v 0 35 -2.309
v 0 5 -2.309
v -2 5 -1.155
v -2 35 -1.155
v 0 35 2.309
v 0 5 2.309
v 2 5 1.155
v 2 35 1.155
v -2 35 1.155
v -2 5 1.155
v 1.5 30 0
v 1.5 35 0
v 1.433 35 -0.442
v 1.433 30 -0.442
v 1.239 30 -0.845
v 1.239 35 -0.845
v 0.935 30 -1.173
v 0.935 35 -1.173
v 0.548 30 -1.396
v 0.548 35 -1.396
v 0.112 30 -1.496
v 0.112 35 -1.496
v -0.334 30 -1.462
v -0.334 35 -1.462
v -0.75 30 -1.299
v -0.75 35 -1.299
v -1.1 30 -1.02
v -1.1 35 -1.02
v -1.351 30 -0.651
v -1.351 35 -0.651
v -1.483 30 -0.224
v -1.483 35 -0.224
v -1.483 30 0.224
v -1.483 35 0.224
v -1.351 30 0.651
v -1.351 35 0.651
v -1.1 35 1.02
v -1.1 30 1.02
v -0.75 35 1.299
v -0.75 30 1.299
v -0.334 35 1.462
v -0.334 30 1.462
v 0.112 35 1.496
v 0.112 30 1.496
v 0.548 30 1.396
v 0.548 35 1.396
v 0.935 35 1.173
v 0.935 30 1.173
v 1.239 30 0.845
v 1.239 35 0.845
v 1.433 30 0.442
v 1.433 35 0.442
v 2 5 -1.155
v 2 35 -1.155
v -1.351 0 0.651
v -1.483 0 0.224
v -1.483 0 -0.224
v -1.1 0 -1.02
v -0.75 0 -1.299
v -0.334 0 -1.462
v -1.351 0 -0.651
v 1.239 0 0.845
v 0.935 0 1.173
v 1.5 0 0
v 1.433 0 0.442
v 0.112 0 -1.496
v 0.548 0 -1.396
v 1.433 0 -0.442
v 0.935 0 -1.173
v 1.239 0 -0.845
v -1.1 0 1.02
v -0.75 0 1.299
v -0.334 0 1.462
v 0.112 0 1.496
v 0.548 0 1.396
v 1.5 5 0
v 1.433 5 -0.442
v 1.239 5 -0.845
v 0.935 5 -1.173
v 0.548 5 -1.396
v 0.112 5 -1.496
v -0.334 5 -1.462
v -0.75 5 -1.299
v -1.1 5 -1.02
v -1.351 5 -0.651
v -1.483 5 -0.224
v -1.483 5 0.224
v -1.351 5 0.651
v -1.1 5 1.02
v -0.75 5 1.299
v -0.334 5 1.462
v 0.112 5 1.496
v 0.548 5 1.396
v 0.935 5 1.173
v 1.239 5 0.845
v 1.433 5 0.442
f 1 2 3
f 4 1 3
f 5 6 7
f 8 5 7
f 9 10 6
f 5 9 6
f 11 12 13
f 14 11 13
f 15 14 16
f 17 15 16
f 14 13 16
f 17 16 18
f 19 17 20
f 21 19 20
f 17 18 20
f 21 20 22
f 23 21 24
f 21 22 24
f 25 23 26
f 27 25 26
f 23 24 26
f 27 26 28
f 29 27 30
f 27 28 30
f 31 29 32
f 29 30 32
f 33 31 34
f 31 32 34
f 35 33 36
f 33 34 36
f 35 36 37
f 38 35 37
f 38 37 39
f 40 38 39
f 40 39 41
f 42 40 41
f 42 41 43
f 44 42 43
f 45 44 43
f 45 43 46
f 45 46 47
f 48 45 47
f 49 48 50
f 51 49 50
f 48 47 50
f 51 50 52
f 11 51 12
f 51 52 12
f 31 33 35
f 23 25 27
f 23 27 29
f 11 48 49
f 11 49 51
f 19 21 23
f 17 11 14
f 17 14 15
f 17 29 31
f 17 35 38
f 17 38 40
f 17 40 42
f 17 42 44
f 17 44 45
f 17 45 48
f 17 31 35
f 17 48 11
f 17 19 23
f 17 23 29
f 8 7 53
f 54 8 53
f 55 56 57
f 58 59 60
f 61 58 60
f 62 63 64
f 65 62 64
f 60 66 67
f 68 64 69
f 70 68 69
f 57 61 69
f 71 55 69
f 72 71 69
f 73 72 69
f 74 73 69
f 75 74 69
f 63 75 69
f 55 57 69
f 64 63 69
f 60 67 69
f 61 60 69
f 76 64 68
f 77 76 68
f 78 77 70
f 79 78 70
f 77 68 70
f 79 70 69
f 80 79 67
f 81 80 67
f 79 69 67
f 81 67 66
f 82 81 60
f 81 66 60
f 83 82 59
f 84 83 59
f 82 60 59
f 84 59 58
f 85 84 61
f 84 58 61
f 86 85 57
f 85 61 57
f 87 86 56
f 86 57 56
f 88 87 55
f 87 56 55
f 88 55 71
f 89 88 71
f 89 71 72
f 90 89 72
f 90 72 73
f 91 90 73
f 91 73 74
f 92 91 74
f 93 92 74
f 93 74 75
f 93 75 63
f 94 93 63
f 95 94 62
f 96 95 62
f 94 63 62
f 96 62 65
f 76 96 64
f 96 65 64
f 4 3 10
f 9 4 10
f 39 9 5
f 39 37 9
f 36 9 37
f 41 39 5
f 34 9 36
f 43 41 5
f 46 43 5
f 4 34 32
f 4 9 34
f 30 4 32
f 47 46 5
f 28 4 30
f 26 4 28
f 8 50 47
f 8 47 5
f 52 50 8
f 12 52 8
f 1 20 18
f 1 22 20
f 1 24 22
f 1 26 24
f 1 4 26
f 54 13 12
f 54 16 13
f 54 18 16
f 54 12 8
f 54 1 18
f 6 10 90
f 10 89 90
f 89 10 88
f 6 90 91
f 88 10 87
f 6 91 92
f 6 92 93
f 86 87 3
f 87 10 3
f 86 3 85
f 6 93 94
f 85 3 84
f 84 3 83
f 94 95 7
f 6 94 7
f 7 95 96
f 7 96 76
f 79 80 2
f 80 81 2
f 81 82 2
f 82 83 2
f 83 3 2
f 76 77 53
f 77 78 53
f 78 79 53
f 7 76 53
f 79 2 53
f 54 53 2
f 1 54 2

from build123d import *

# Parameters (mm, degrees)
SKETCH_1_R          = 1.5
EXTRUDE_1_DEPTH     = 5
EXTRUDE_2_DEPTH     = 30
SKETCH_3_R          = 1.5
CUT_EXTRUDE_1_DEPTH = 5


with BuildPart() as part:
    # 草图1 → 凸台-拉伸1 (new body)
    with BuildSketch(Plane(origin=(0, 0, 0), x_dir=(1, 0, 0), z_dir=(0, 1, 0))):
        Circle(SKETCH_1_R)
    extrude(amount=EXTRUDE_1_DEPTH)

    # 草图2 → 凸台-拉伸2 (add)
    with BuildSketch(Plane(origin=(0, 5, 0), x_dir=(1, 0, 0), z_dir=(0, 1, 0))):
        Polygon((0, 2.309401077), (-2, 1.154700538), (-2, -1.154700538), (0, -2.309401077), (2, -1.154700538), (2, 1.154700538), align=None)
    extrude(amount=EXTRUDE_2_DEPTH)

    # 草图3 → 切除-拉伸1 (cut)
    with BuildSketch(Plane(origin=(0, 35, 0), x_dir=(1, 0, 0), z_dir=(0, 1, 0))):
        Circle(SKETCH_3_R)
    extrude(amount=-CUT_EXTRUDE_1_DEPTH, mode=Mode.SUBTRACT)


solid = part.part
